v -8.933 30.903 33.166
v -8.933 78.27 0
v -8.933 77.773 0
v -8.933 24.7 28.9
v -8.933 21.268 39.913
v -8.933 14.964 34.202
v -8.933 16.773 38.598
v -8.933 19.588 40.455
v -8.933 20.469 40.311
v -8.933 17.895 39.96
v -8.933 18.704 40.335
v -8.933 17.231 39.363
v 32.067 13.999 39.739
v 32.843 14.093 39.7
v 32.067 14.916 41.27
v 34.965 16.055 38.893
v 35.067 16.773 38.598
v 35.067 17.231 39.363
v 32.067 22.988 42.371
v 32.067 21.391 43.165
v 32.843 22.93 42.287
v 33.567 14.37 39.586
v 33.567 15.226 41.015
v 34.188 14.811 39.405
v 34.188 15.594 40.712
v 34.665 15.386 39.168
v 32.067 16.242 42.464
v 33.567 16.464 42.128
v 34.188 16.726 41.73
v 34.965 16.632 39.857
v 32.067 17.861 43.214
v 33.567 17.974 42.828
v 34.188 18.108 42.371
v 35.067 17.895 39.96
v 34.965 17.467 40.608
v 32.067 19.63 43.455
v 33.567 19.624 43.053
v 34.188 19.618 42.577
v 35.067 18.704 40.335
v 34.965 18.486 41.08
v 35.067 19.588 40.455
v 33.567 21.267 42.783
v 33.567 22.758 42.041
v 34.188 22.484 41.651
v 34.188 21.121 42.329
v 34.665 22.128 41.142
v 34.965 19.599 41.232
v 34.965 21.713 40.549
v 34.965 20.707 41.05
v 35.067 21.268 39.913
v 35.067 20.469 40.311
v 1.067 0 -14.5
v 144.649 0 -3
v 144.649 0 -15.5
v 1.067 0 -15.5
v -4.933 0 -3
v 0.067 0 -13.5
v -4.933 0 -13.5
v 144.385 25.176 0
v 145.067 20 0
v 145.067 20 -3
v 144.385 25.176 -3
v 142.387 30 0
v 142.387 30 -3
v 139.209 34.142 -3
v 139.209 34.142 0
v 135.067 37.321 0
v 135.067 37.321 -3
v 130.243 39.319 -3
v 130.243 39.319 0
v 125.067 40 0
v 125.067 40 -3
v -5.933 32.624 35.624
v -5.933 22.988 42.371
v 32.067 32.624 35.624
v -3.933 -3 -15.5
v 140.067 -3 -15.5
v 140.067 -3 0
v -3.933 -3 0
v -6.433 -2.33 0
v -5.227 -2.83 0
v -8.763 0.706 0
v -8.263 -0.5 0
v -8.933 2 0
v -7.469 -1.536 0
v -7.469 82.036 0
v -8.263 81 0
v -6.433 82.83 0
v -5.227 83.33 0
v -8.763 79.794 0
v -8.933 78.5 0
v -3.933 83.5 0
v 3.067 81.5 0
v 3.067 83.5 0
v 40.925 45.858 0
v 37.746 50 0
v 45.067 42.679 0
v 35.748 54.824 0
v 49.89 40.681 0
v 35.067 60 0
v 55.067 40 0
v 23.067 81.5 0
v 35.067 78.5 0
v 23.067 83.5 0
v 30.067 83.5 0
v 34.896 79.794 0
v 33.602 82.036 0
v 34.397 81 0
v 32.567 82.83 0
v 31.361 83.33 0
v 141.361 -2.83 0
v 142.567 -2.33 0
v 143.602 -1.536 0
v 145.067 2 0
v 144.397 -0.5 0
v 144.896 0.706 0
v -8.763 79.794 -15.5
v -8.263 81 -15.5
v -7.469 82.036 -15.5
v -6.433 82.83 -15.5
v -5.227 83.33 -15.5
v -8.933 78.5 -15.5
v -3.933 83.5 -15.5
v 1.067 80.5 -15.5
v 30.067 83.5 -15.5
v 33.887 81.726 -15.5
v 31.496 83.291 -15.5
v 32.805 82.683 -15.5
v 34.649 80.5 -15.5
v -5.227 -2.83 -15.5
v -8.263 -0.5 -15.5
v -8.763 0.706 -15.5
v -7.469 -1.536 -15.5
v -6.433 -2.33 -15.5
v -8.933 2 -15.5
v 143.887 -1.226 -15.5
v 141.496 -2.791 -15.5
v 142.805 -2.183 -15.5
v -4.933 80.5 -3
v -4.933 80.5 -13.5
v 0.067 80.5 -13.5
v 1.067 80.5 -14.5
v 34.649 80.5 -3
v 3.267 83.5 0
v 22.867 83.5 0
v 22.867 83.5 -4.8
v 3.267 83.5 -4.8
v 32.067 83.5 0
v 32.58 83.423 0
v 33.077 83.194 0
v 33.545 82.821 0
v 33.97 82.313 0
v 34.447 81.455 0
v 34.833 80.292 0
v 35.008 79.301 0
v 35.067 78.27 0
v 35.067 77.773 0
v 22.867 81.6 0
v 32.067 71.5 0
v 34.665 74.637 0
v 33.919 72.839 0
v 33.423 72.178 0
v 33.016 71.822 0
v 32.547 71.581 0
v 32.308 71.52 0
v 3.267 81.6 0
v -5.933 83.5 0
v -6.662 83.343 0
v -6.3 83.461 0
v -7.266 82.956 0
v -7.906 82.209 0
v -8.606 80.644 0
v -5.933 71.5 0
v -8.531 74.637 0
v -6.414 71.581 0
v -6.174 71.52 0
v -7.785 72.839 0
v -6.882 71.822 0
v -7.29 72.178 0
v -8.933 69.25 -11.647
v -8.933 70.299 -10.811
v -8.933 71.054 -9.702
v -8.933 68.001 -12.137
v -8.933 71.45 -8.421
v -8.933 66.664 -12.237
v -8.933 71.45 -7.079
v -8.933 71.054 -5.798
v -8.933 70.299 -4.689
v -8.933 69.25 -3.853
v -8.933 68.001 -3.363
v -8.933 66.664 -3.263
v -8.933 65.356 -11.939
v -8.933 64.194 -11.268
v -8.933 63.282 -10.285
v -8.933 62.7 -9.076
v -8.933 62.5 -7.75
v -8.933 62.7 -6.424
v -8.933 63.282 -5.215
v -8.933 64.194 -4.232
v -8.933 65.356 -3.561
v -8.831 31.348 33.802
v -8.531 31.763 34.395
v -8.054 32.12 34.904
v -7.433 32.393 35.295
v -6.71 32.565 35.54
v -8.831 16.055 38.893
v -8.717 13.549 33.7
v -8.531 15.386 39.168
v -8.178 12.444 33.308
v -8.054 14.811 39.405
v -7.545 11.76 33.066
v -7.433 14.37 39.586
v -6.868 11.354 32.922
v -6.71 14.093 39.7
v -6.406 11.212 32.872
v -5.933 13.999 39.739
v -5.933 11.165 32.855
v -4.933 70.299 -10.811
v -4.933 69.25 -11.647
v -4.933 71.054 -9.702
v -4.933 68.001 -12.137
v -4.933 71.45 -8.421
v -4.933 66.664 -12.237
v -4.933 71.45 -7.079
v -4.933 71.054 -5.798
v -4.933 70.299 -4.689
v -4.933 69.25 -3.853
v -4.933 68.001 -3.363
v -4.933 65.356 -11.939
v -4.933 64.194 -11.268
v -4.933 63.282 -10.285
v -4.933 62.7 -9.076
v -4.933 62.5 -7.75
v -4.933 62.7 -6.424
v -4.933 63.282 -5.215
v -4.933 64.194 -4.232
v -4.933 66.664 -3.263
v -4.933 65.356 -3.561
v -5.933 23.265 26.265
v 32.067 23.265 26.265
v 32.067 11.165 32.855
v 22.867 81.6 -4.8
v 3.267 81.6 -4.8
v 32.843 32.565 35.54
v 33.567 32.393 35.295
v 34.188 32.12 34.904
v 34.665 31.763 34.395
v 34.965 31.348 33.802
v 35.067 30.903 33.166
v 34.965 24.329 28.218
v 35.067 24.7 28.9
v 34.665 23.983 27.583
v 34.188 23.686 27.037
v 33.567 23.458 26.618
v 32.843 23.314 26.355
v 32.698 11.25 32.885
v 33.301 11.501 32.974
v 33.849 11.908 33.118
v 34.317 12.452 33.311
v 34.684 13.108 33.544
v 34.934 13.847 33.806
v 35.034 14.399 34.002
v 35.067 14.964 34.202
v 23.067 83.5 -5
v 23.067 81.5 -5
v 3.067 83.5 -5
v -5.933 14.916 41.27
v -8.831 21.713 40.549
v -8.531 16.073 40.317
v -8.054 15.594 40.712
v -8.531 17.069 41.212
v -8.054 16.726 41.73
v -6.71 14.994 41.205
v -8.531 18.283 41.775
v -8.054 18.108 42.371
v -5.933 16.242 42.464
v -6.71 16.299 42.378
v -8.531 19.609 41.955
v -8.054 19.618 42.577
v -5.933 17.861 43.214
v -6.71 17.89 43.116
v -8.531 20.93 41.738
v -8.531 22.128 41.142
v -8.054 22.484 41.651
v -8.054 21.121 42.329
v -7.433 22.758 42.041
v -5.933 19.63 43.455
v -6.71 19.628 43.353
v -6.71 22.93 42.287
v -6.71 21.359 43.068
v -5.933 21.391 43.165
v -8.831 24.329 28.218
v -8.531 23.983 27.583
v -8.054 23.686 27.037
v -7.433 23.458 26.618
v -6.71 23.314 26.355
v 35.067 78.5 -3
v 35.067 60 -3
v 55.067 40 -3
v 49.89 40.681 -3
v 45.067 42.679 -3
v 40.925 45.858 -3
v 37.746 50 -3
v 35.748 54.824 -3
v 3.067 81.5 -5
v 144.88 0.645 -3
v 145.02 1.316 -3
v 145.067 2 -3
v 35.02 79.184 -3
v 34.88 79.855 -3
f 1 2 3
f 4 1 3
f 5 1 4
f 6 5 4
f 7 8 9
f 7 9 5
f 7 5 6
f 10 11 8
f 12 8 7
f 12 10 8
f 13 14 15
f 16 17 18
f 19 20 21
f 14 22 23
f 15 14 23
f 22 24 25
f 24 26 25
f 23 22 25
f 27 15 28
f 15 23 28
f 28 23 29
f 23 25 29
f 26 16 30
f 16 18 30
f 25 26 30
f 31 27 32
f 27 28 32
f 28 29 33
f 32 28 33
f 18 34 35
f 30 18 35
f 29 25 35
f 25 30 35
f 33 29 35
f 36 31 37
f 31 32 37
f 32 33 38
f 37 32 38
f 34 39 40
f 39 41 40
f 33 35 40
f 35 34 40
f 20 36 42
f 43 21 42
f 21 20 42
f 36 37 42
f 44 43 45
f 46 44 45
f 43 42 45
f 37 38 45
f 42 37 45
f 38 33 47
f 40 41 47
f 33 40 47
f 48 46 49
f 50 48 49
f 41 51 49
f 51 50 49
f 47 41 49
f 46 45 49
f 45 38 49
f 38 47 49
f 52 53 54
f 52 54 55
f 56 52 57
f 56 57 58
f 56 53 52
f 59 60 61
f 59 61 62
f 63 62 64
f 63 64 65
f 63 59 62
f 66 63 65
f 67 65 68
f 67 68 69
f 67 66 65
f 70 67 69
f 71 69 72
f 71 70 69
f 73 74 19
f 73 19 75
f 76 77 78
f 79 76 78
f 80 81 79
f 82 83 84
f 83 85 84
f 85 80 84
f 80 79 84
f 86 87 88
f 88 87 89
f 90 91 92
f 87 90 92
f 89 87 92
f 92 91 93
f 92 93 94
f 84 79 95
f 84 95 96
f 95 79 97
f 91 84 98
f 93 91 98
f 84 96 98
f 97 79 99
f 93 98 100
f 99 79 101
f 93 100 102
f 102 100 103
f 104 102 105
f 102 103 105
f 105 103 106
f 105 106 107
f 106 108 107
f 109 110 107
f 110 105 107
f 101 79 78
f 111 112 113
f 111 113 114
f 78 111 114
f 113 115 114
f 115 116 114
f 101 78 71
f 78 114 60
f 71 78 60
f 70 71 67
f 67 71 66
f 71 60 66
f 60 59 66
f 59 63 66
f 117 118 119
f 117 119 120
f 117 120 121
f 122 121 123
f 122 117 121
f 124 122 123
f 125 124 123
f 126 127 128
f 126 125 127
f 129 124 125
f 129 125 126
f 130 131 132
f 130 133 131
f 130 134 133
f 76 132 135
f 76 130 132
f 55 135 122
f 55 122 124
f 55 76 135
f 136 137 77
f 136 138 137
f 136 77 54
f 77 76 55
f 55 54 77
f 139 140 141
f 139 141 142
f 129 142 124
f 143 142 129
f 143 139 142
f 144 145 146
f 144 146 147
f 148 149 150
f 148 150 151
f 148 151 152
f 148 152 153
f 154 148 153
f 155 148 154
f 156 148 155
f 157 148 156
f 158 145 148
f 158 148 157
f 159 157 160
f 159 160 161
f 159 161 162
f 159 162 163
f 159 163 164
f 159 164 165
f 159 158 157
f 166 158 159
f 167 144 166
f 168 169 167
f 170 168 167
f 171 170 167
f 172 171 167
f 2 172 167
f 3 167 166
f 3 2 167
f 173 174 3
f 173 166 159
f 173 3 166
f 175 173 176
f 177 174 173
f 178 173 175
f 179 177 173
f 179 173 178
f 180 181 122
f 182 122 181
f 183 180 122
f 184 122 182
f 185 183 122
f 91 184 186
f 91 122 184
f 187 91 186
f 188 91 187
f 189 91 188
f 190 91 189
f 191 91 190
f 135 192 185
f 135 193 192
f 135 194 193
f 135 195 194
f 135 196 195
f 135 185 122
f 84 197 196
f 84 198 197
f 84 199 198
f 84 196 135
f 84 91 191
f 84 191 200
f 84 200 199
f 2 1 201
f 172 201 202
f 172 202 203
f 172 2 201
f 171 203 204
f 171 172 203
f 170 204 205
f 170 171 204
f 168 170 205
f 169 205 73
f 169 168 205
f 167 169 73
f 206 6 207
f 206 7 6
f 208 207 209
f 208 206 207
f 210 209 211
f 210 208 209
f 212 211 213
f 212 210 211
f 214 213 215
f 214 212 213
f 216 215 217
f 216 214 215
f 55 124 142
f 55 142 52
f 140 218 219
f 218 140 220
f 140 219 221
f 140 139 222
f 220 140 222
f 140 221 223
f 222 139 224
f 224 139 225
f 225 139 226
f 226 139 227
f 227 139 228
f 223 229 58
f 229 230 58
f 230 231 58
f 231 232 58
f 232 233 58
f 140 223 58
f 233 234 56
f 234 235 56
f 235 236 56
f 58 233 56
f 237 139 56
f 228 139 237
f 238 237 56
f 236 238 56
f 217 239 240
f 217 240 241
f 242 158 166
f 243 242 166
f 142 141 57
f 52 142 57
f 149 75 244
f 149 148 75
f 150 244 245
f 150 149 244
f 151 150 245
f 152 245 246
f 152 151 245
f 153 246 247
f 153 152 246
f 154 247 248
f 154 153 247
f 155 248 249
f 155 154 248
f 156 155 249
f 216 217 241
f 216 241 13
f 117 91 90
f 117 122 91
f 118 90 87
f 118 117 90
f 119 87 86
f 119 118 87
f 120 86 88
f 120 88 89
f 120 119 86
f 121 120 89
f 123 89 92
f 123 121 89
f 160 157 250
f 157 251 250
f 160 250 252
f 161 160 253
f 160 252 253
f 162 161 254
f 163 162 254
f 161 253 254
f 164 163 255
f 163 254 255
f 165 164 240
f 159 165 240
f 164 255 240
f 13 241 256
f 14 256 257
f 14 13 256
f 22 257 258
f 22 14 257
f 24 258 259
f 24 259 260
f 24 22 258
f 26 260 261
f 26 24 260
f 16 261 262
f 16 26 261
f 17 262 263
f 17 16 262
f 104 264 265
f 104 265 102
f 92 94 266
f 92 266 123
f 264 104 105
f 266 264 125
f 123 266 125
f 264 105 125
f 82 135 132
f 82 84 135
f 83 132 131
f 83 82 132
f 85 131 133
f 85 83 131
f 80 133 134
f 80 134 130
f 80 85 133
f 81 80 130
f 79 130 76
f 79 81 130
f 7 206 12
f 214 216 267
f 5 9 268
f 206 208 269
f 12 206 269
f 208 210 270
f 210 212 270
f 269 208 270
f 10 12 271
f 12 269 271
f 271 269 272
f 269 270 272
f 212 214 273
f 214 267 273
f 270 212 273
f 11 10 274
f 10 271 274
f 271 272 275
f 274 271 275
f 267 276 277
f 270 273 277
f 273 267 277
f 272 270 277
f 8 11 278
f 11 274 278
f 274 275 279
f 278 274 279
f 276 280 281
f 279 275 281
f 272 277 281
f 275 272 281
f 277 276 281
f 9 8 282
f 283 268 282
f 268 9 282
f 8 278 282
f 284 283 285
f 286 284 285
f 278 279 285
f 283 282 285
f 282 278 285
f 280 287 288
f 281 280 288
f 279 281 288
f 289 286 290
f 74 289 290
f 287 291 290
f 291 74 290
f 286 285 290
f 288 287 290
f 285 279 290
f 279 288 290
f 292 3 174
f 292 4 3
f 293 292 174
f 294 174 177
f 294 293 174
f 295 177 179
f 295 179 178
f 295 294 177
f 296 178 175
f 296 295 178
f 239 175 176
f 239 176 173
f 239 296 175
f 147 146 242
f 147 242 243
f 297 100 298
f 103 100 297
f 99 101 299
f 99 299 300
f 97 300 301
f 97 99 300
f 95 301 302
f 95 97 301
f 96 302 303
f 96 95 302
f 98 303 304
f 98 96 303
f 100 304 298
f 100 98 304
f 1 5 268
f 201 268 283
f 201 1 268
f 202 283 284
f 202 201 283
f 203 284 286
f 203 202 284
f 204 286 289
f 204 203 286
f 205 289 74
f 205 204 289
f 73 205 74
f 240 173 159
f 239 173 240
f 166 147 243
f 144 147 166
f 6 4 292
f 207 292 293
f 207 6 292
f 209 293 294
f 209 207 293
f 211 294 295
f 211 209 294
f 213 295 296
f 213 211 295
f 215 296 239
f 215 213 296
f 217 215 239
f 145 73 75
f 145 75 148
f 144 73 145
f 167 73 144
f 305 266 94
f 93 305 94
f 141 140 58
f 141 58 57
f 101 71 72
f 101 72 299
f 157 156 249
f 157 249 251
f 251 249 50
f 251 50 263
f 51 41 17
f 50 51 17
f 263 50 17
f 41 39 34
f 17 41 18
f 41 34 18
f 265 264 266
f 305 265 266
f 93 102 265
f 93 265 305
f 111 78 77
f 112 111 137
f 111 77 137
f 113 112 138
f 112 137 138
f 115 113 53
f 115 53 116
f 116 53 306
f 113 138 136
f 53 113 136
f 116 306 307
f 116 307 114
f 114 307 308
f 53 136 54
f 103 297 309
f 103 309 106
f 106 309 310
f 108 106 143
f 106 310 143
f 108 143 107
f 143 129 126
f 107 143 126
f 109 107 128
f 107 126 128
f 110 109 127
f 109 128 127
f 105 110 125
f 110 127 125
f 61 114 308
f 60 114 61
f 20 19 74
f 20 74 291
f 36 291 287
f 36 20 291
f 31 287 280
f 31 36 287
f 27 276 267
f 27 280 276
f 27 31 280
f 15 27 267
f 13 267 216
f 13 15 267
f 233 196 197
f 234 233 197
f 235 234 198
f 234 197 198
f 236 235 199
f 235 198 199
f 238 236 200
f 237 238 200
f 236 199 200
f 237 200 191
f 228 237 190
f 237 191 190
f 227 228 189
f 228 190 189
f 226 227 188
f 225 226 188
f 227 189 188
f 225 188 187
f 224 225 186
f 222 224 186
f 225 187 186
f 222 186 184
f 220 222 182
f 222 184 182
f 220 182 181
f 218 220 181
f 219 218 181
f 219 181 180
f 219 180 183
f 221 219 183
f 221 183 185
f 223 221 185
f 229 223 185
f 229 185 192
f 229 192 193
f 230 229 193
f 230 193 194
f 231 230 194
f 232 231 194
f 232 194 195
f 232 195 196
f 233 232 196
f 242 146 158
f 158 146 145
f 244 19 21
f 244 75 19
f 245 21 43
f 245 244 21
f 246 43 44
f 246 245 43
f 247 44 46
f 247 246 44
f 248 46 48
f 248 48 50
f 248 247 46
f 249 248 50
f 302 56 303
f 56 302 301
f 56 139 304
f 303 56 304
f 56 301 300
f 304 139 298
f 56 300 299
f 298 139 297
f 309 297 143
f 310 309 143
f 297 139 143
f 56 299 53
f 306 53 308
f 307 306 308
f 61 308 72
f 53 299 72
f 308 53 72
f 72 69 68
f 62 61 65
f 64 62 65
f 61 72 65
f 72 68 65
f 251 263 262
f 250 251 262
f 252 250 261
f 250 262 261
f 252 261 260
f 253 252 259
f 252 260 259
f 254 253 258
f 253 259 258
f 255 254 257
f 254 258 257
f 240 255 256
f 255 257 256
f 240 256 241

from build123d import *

# Parameters (mm, degrees)
F1_DEPTH  = 3
F0_W      = 40
F0_H      = 3
F2_DEPTH  = 15.5
F3_W      = 80.5
F3_H      = 12.5
F4_DEPTH  = 4
F5_W      = 6
F5_H      = 80.5
F6_DEPTH  = 2
F7_R      = 4.5
F8_DEPTH  = 25
F10_DEPTH = 44
F11_W     = 20
F11_H     = 5
F12_DEPTH = 2
F13_W     = 19.6
F13_H     = 4.8
F14_DEPTH = 1.9
F15_R     = 6
F16_R     = 3
F17_R     = 5
F18_SIZE  = 1
F19_R     = 5
F20_R     = 5


with BuildPart() as f1:
    # F0 (on Top) → F1 (new body)
    with BuildSketch(Plane.XY):
        with BuildLine():
            Line((-4.9331504512, 80.5), (-4.9331504512, 0))
            Line((-4.9331504512, 0), (35.0668495488, 0))
            Line((35.0668495488, 0), (145.0668495488, 0))
            Line((145.0668495488, 0), (145.0668495488, 20))
            ThreePointArc((145.0668495488, 20), (139.2089851725, 34.1421356237), (125.0668495488, 40))
            Line((125.0668495488, 40), (55.0668495488, 40))
            ThreePointArc((55.0668495488, 40), (40.9247139251, 45.8578643763), (35.0668495488, 60))
            Line((35.0668495488, 60), (35.0668495488, 80.5))
            Line((35.0668495488, 80.5), (-4.9331504512, 80.5))
        make_face()
    extrude(amount=-F1_DEPTH)

    # F0 (on Top) → F2 (join)
    with BuildSketch(Plane.XY):
        with Locations((15.0668495488, 82)):
            Rectangle(F0_W, F0_H)
        Polygon((35.0668495488, 0), (-4.9331504512, 0), (-4.9331504512, -3), (145.0668495488, -3), (145.0668495488, 0), align=None)
    extrude(amount=-F2_DEPTH)

    # F3 (on face) → F4 (join)
    with BuildSketch(Plane(origin=(-4.9331504512, 0, 0), x_dir=(0, -1, 0), z_dir=(-1, 0, 0))):
        with Locations((-40.25, -9.25)):
            Rectangle(F3_W, F3_H)
        Polygon((-83.5, 0), (-83.5, -15.5), (-80.5, -15.5), (-80.5, -3), (0, -3), (0, -15.5), (3, -15.5), (3, 0), align=None)
    extrude(amount=F4_DEPTH)

    # F5 (on face) → F6 (join)
    with BuildSketch(Plane(origin=(0, 0, -15.5), x_dir=(1, 0, 0), z_dir=(0, 0, -1))):
        with Locations((-1.9331504512, -40.25)):
            Rectangle(F5_W, F5_H)
    extrude(amount=-F6_DEPTH)

    # F7 (on face) → F8 (cut)
    with BuildSketch(Plane(origin=(-8.9331504512, 0, 0), x_dir=(0, -1, 0), z_dir=(-1, 0, 0))):
        with Locations((-67, -7.75)):
            Circle(F7_R)
    extrude(amount=-F8_DEPTH, mode=Mode.SUBTRACT)

    # F11 (on face) → F12 (cut)
    with BuildSketch(Plane(origin=(0, 83.5, 0), x_dir=(-1, 0, 0), z_dir=(0, 1, 0))):
        with Locations((-13.0668495488, -2.5)):
            Rectangle(F11_W, F11_H)
    extrude(amount=-F12_DEPTH, mode=Mode.SUBTRACT)

    # F17
    f17_edges = [f1.edges().sort_by_distance(p)[0] for p in [
        (-8.93315, 83.5, -7.75),
        (35.06685, 83.5, -7.75),
    ]]
    fillet(f17_edges, radius=F17_R)

    # F18
    f18_edges = [f1.edges().sort_by_distance(p)[0] for p in [
        (1.06685, 40.25, -13.5),
    ]]
    chamfer(f18_edges, length=F18_SIZE)

    # F19
    f19_edges = [f1.edges().sort_by_distance(p)[0] for p in [
        (-8.93315, -3, -7.75),
    ]]
    fillet(f19_edges, radius=F19_R)

    # F20
    f20_edges = [f1.edges().sort_by_distance(p)[0] for p in [
        (145.06685, -3, -7.75),
    ]]
    fillet(f20_edges, radius=F20_R)


with BuildPart() as f10:
    # F9 (on face) → F10 (new body)
    with BuildSketch(Plane(origin=(-8.9331504512, 0, 0), x_dir=(0, -1, 0), z_dir=(-1, 0, 0))):
        Polygon((-32.6238580844, 35.6238580844), (-83.5, 0), (-71.5, 0), (-23.2654577068, 26.2654577068), align=None)
        Polygon((-16.8503914992, 46.668558291), (-32.6238580844, 35.6238580844), (-23.2654577068, 26.2654577068), (-11.1649248647, 32.8546367159), align=None)
    extrude(amount=-F10_DEPTH)

    # F13 (on face) → F14 (join)
    with BuildSketch(Plane(origin=(0, 83.5, 0), x_dir=(-1, 0, 0), z_dir=(0, 1, 0))):
        with Locations((-13.0668495488, -2.4)):
            Rectangle(F13_W, F13_H)
    extrude(amount=-F14_DEPTH)

    # F15
    f15_edges = [f10.edges().sort_by_distance(p)[0] for p in [
        (13.06685, 16.850391, 46.668558),
    ]]
    fillet(f15_edges, radius=F15_R)

    # F16
    f16_edges = [f10.edges().sort_by_distance(p)[0] for p in [
        (-8.93315, 53.244202, 21.185338),
        (35.06685, 53.244202, 21.185338),
        (-8.93315, 41.332462, 16.427318),
        (35.06685, 41.332462, 16.427318),
    ]]
    fillet(f16_edges, radius=F16_R)


solid = Compound([f1.part, f10.part])
